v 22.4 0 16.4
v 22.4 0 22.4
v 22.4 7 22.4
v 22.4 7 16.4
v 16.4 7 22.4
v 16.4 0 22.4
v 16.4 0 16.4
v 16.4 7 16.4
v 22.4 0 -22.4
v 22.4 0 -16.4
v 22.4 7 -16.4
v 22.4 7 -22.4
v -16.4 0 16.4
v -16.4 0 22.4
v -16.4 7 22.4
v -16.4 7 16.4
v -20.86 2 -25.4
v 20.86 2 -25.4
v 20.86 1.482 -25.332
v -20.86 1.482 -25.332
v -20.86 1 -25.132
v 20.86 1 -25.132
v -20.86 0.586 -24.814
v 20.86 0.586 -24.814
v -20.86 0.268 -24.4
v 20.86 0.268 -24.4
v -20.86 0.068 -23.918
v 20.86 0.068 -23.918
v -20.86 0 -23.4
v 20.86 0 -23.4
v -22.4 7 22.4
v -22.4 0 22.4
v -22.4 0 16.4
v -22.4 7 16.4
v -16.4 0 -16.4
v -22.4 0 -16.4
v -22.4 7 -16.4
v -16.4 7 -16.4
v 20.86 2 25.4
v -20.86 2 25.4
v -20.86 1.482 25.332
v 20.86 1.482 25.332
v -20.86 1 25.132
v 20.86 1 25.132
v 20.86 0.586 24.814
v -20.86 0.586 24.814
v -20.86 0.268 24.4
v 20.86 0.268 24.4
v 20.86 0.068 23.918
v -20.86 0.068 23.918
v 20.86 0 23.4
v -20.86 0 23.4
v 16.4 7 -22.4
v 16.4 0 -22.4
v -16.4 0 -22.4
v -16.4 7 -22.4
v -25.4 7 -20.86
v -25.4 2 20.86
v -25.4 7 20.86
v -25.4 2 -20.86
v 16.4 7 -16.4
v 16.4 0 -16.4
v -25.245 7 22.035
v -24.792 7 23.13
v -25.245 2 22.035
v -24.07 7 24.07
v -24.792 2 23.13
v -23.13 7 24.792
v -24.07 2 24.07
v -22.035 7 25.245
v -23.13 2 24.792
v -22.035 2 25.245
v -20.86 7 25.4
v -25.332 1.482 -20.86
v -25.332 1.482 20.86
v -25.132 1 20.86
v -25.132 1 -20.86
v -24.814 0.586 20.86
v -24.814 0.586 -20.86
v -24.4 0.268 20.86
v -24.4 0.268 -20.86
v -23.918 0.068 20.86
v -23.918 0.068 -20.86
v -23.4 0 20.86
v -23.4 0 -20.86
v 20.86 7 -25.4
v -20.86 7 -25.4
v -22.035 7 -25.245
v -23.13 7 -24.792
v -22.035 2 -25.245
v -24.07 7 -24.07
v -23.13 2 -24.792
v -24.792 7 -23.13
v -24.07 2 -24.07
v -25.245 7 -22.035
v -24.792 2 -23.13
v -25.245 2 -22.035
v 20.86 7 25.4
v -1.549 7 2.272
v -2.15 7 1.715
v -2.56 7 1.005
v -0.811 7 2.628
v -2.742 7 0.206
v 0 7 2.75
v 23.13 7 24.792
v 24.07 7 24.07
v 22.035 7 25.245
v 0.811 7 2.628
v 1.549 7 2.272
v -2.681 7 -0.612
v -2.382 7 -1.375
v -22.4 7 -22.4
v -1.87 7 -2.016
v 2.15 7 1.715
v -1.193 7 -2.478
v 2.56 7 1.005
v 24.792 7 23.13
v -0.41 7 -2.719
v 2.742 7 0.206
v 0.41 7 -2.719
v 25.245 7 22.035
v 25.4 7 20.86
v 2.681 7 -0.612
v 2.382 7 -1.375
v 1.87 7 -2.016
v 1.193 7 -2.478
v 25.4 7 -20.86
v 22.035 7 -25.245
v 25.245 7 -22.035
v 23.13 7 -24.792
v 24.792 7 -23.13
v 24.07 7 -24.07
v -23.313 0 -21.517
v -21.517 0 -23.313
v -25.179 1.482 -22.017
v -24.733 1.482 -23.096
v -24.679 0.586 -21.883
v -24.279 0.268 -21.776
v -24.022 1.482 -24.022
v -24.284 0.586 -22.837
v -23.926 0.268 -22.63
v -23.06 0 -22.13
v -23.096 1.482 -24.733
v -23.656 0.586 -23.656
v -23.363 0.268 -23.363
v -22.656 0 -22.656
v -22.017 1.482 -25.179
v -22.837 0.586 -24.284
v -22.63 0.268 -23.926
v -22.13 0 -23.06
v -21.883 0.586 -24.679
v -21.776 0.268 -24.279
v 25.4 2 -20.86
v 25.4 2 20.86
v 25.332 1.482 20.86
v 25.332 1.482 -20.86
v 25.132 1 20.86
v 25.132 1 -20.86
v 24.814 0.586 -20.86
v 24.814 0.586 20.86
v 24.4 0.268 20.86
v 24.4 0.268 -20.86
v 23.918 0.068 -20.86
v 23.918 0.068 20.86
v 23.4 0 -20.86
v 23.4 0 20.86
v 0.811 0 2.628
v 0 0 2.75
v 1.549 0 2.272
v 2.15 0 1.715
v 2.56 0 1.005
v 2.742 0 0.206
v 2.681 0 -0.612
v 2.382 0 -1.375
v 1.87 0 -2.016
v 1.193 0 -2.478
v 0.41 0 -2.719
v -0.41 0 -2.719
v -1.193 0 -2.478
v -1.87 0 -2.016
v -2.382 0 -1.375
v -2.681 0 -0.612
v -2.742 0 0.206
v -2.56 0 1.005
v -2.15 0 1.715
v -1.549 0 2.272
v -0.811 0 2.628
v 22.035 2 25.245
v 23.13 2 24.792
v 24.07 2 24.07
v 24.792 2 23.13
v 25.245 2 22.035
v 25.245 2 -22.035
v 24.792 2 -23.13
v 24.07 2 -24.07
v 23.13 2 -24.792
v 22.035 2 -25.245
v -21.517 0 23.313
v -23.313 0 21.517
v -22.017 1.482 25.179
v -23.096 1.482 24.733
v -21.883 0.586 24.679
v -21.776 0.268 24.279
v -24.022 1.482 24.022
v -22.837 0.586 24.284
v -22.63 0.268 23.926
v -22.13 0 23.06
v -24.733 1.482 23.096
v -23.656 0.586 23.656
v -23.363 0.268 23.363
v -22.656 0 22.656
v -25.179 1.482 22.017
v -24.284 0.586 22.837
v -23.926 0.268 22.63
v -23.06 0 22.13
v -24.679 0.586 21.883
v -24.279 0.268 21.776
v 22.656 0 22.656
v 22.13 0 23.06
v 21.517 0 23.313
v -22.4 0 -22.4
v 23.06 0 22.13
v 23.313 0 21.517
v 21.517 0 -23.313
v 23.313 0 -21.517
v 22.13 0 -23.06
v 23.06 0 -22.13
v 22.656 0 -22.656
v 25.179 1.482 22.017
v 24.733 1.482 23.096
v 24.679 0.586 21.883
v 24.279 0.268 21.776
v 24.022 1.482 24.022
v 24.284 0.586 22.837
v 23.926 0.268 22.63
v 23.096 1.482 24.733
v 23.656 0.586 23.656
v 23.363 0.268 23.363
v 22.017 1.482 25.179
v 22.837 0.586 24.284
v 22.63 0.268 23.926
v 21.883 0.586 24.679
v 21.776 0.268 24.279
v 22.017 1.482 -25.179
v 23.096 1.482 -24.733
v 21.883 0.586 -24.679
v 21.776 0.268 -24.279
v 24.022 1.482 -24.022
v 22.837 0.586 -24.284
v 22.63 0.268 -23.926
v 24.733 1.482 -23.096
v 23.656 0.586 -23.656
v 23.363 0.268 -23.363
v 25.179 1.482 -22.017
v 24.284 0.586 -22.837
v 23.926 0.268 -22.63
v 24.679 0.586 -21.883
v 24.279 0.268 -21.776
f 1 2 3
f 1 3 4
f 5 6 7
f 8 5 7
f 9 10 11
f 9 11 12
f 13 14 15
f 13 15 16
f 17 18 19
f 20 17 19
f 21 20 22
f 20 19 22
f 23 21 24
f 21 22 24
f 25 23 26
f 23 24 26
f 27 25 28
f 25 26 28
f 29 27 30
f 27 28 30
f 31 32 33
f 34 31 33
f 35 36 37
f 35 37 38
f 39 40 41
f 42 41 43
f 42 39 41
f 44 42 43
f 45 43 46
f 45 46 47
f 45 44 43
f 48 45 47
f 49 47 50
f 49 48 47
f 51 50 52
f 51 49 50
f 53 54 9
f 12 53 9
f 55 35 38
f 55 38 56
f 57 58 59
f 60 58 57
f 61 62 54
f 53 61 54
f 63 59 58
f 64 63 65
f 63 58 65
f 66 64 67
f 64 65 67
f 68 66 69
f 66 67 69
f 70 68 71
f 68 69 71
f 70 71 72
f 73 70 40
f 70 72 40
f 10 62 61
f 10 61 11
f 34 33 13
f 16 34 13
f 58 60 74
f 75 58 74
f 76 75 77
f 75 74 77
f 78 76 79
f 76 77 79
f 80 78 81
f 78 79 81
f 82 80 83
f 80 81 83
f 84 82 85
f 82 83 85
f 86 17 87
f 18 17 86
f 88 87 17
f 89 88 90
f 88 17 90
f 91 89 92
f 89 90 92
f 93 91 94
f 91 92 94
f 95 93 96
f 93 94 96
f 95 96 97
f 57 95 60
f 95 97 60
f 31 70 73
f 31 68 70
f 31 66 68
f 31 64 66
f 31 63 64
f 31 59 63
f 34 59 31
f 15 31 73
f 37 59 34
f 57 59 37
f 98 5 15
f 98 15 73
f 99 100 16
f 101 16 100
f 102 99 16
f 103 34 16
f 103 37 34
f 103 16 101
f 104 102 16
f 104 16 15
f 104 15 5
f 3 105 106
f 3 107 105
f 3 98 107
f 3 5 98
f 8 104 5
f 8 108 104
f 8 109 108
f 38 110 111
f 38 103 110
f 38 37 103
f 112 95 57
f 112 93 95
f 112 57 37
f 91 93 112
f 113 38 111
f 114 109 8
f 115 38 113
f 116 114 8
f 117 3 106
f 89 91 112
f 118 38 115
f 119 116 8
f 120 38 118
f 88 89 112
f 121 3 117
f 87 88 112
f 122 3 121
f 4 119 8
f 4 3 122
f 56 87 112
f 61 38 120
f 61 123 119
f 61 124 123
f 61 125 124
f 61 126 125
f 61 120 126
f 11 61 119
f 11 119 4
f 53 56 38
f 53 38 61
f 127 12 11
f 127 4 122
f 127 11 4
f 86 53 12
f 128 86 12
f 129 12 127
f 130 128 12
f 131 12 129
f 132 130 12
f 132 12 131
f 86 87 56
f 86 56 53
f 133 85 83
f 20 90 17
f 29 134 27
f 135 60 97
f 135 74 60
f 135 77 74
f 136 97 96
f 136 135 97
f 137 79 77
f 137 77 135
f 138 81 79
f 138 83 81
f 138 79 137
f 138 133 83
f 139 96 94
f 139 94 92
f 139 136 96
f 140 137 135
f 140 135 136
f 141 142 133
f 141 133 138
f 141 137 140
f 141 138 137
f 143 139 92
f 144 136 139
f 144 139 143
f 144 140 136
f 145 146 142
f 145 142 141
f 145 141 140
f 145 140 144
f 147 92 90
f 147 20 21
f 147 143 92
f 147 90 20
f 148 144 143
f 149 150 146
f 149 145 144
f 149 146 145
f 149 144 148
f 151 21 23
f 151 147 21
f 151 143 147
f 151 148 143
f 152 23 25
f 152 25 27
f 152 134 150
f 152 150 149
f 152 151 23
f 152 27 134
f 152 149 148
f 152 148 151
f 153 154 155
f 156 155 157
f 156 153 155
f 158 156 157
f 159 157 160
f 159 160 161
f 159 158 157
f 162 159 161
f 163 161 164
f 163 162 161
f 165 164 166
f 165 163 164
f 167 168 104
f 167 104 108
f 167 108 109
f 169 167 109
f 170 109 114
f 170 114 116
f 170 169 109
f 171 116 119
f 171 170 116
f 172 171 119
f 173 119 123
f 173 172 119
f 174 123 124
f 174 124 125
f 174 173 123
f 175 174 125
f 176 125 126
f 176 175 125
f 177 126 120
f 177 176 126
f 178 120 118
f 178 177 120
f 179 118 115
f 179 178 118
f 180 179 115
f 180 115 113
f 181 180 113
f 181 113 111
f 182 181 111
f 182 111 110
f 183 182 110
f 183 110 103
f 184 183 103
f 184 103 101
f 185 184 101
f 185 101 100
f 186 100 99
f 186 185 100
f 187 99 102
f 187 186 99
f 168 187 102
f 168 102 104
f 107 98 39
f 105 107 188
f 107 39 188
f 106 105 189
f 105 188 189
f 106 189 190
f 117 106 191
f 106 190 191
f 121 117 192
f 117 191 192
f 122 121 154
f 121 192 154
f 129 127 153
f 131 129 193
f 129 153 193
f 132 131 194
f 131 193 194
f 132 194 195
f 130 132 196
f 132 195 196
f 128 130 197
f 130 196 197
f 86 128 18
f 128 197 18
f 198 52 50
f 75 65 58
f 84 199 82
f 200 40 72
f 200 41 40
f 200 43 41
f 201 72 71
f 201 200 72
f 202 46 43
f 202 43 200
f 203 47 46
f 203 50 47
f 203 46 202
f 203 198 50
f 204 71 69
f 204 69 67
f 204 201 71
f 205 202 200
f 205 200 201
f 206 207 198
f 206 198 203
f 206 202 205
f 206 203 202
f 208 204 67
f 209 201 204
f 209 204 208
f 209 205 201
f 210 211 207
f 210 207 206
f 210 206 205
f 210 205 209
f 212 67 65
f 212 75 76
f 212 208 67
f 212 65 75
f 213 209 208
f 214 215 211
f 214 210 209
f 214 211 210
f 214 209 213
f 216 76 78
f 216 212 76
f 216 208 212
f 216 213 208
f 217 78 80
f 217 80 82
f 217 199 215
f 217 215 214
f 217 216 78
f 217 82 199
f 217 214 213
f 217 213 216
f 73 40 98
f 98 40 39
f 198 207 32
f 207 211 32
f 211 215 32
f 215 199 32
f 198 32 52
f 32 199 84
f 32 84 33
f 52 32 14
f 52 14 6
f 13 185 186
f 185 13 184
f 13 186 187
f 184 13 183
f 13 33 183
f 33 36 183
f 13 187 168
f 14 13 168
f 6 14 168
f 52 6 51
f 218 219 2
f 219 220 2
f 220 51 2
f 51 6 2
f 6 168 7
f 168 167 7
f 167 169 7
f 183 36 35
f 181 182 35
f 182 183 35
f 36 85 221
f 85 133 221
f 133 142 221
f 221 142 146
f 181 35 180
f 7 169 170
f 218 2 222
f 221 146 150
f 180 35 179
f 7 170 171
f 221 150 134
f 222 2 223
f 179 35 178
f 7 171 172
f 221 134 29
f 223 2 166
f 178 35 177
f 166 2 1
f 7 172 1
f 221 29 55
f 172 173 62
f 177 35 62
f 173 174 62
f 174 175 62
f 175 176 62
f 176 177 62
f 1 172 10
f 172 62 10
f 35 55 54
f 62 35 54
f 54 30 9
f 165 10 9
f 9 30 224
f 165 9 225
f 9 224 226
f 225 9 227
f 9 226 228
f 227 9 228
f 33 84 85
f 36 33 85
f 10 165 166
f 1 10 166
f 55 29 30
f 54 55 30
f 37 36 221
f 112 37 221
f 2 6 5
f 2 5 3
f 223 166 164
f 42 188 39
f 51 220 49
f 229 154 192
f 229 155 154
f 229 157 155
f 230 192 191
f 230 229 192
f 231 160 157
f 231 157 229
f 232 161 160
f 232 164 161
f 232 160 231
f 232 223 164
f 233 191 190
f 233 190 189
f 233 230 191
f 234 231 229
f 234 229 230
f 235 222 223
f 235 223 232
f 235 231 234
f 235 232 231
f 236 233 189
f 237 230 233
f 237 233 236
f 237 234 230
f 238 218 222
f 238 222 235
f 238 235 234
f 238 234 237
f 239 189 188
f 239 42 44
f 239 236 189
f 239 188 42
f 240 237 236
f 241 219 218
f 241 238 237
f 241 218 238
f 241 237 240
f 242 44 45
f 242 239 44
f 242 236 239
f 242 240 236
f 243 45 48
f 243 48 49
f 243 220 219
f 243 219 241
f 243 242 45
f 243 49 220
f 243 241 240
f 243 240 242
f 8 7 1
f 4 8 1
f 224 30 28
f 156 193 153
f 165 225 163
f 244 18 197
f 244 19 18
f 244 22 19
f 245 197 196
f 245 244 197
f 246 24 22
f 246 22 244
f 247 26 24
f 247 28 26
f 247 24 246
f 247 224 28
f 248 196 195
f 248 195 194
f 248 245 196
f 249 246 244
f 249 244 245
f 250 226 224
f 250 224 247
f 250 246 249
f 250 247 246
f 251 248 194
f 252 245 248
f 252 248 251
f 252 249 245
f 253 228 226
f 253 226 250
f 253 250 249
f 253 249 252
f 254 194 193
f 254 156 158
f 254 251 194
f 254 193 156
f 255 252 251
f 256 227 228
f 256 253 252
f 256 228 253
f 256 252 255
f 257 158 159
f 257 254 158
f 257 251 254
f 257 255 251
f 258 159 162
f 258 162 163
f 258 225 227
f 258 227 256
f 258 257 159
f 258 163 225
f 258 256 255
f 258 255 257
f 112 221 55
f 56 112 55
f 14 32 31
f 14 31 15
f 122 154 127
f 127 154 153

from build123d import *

# Parameters (mm, degrees)
SKETCH1_W           = 50.8
SKETCH1_H           = 50.8
SKETCH1_R           = 2.75
SKETCH1_W_2         = 6
SKETCH1_H_2         = 6
BOSS_EXTRUDE1_DEPTH = 7
FILLET1_R           = 2
FILLET2_R           = 4.54


with BuildPart() as part:
    # Sketch1 → Boss-Extrude1 (new body)
    with BuildSketch(Plane(origin=(0, 0, 0), x_dir=(1, 0, 0), z_dir=(0, 1, 0))):
        Rectangle(SKETCH1_W, SKETCH1_H)
        with Locations(Location((0, 0, 0), (0, 0, 270))):
            Circle(SKETCH1_R, mode=Mode.SUBTRACT)
        with Locations((-19.4, 19.4)):
            Rectangle(SKETCH1_W_2, SKETCH1_H_2, mode=Mode.SUBTRACT)
        with Locations((19.4, 19.4)):
            Rectangle(SKETCH1_W_2, SKETCH1_H_2, mode=Mode.SUBTRACT)
        with Locations((-19.4, -19.4)):
            Rectangle(SKETCH1_W_2, SKETCH1_H_2, mode=Mode.SUBTRACT)
        with Locations((19.4, -19.4)):
            Rectangle(SKETCH1_W_2, SKETCH1_H_2, mode=Mode.SUBTRACT)
    extrude(amount=BOSS_EXTRUDE1_DEPTH)

    # Fillet1
    fillet1_edges = [part.edges().sort_by_distance(p)[0] for p in [
        (0, 0, 25.4),
        (-25.4, 0, 0),
        (0, 0, -25.4),
        (25.4, 0, 0),
    ]]
    fillet(fillet1_edges, radius=FILLET1_R)

    # Fillet2
    # the kernel refuses this fillet: 4.54 mm, written as the material it takes off along each edge
    with BuildSketch(Plane(origin=(20.86, 0, -20.86), x_dir=(0, 0, -1), z_dir=(-1, 0, 0))) as fillet2_piece_1:
        with BuildLine():
            CenterArc((2.54, -2), 2, 0, 90)
            Line((4.54, -2), (4.54, 0))
            Line((4.54, 0), (2.54, 0))
        make_face()
    revolve(axis=Axis((20.86, 0, -20.86), (0, -1, 0)), revolution_arc=90, mode=Mode.SUBTRACT)
    with BuildSketch(Plane(origin=(20.86, 0, 20.86), x_dir=(1, 0, 0), z_dir=(0, 0, -1))) as fillet2_piece_2:
        with BuildLine():
            CenterArc((2.54, -2), 2, 0, 90)
            Line((4.54, -2), (4.54, 0))
            Line((4.54, 0), (2.54, 0))
        make_face()
    revolve(axis=Axis((20.86, 0, 20.86), (0, -1, 0)), revolution_arc=90, mode=Mode.SUBTRACT)
    with BuildSketch(Plane(origin=(-20.86, 0, -20.86), x_dir=(-1, 0, 0), z_dir=(0, 0, 1))) as fillet2_piece_3:
        with BuildLine():
            CenterArc((2.54, -2), 2, 0, 90)
            Line((4.54, -2), (4.54, 0))
            Line((4.54, 0), (2.54, 0))
        make_face()
    revolve(axis=Axis((-20.86, 0, -20.86), (0, -1, 0)), revolution_arc=90, mode=Mode.SUBTRACT)
    with BuildSketch(Plane(origin=(-20.86, 0, 20.86), x_dir=(0, 0, 1), z_dir=(1, 0, 0))) as fillet2_piece_4:
        with BuildLine():
            CenterArc((2.54, -2), 2, 0, 90)
            Line((4.54, -2), (4.54, 0))
            Line((4.54, 0), (2.54, 0))
        make_face()
    revolve(axis=Axis((-20.86, 0, 20.86), (0, -1, 0)), revolution_arc=90, mode=Mode.SUBTRACT)
    with BuildSketch(Plane(origin=(25.4, 0, 25.4), x_dir=(0, 0, -1), z_dir=(0, 1, 0)), Plane(origin=(25.4, 0, -25.4), x_dir=(-1, 0, 0), z_dir=(0, 1, 0))) as fillet2_piece_5:
        with BuildLine():
            CenterArc((FILLET2_R, FILLET2_R), FILLET2_R, 180, 90)
            Line((0, FILLET2_R), (0, 0))
            Line((0, 0), (FILLET2_R, 0))
        make_face()
    extrude(amount=18.35, mode=Mode.SUBTRACT)
    with BuildSketch(Plane(origin=(-25.4, 0, 25.4), x_dir=(0, 0, -1), z_dir=(0, 1, 0)), Plane(origin=(-25.4, 0, -25.4), x_dir=(1, 0, 0), z_dir=(0, 1, 0))) as fillet2_piece_6:
        with BuildLine():
            CenterArc((FILLET2_R, -FILLET2_R), FILLET2_R, 90, 90)
            Line((0, -FILLET2_R), (0, 0))
            Line((0, 0), (FILLET2_R, 0))
        make_face()
    extrude(amount=18.35, mode=Mode.SUBTRACT)


solid = part.part
